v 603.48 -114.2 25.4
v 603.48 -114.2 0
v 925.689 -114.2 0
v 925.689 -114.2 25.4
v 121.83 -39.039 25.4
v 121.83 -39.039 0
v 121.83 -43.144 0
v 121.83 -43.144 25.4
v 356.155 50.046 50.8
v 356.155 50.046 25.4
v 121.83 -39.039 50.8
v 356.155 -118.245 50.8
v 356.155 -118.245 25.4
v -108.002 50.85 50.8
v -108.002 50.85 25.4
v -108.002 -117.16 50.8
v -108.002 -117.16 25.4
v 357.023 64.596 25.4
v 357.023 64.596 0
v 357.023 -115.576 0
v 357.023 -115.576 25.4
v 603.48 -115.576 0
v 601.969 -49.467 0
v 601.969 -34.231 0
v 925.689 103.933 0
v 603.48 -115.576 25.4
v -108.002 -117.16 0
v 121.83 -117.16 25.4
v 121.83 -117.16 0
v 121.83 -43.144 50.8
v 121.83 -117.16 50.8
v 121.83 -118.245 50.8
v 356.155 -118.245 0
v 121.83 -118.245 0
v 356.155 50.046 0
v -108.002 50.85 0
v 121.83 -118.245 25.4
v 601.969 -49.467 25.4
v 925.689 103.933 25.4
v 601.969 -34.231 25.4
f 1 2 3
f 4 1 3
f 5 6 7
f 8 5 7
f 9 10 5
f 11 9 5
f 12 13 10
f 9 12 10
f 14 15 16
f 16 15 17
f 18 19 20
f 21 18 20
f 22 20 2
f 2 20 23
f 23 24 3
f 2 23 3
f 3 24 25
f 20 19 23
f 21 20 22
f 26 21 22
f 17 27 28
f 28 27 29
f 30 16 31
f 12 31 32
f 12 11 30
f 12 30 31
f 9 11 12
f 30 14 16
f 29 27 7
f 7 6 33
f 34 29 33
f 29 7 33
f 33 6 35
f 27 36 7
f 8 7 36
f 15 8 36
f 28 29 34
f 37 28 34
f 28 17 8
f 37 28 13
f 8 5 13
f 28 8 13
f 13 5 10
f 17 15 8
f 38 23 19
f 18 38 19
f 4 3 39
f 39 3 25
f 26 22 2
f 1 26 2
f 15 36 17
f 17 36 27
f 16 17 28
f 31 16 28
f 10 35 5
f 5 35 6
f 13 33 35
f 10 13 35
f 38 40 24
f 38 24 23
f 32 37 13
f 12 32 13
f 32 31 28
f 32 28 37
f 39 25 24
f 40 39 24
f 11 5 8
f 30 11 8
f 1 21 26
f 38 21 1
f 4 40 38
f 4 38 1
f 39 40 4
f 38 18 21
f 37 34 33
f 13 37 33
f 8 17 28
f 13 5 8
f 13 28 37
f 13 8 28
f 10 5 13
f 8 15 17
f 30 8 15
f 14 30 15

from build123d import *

# Parameters (mm, degrees)
F1_DEPTH = 25.4
F3_DEPTH = 25.4
F5_DEPTH = 25.4
F7_DEPTH = 25.4


with BuildPart() as f1:
    # F0 (on Top) → F1 (new body)
    with BuildSketch(Plane.XY):
        Polygon((-108.002335, 50.849989), (-108.002335, -117.160052), (124.526531, -117.160052), (124.526531, -44.246912), align=None)
    extrude(amount=F1_DEPTH)

    # F2 (on Top) → F3 (join)
    with BuildSketch(Plane.XY):
        Polygon((121.829599, -39.03918), (121.829599, -118.244544), (356.155217, -118.244544), (356.155217, 50.045814), align=None)
    extrude(amount=F3_DEPTH)


with BuildPart() as f5:
    # F4 (on Top) + F3_face (on face) → F5 (new body)
    with BuildSketch(Plane.XY):
        Polygon((357.022703, 64.596415), (357.022703, -115.576446), (603.479803, -115.576446), (603.479803, -50.169855), align=None)
    with BuildSketch(Plane(origin=(125.264919, -53.655909, 25.4), x_dir=(1, 0, 0), z_dir=(0, 0, 1))):
        Polygon((-3.43532, 10.511956), (-233.267254, 104.505898), (-233.267254, -63.504143), (-3.43532, -63.504143), (-3.43532, -64.588635), (230.890298, -64.588635), (230.890298, 103.701723), (-3.43532, 14.616729), align=None)
    extrude(amount=F5_DEPTH)

    # F6 (on Top) → F7 (join)
    with BuildSketch(Plane.XY):
        Polygon((601.969481, -34.231037), (601.969481, -114.199877), (925.68922, -114.199877), (925.68922, 103.933185), align=None)
    extrude(amount=F7_DEPTH)


solid = Compound([f1.part, f5.part])
